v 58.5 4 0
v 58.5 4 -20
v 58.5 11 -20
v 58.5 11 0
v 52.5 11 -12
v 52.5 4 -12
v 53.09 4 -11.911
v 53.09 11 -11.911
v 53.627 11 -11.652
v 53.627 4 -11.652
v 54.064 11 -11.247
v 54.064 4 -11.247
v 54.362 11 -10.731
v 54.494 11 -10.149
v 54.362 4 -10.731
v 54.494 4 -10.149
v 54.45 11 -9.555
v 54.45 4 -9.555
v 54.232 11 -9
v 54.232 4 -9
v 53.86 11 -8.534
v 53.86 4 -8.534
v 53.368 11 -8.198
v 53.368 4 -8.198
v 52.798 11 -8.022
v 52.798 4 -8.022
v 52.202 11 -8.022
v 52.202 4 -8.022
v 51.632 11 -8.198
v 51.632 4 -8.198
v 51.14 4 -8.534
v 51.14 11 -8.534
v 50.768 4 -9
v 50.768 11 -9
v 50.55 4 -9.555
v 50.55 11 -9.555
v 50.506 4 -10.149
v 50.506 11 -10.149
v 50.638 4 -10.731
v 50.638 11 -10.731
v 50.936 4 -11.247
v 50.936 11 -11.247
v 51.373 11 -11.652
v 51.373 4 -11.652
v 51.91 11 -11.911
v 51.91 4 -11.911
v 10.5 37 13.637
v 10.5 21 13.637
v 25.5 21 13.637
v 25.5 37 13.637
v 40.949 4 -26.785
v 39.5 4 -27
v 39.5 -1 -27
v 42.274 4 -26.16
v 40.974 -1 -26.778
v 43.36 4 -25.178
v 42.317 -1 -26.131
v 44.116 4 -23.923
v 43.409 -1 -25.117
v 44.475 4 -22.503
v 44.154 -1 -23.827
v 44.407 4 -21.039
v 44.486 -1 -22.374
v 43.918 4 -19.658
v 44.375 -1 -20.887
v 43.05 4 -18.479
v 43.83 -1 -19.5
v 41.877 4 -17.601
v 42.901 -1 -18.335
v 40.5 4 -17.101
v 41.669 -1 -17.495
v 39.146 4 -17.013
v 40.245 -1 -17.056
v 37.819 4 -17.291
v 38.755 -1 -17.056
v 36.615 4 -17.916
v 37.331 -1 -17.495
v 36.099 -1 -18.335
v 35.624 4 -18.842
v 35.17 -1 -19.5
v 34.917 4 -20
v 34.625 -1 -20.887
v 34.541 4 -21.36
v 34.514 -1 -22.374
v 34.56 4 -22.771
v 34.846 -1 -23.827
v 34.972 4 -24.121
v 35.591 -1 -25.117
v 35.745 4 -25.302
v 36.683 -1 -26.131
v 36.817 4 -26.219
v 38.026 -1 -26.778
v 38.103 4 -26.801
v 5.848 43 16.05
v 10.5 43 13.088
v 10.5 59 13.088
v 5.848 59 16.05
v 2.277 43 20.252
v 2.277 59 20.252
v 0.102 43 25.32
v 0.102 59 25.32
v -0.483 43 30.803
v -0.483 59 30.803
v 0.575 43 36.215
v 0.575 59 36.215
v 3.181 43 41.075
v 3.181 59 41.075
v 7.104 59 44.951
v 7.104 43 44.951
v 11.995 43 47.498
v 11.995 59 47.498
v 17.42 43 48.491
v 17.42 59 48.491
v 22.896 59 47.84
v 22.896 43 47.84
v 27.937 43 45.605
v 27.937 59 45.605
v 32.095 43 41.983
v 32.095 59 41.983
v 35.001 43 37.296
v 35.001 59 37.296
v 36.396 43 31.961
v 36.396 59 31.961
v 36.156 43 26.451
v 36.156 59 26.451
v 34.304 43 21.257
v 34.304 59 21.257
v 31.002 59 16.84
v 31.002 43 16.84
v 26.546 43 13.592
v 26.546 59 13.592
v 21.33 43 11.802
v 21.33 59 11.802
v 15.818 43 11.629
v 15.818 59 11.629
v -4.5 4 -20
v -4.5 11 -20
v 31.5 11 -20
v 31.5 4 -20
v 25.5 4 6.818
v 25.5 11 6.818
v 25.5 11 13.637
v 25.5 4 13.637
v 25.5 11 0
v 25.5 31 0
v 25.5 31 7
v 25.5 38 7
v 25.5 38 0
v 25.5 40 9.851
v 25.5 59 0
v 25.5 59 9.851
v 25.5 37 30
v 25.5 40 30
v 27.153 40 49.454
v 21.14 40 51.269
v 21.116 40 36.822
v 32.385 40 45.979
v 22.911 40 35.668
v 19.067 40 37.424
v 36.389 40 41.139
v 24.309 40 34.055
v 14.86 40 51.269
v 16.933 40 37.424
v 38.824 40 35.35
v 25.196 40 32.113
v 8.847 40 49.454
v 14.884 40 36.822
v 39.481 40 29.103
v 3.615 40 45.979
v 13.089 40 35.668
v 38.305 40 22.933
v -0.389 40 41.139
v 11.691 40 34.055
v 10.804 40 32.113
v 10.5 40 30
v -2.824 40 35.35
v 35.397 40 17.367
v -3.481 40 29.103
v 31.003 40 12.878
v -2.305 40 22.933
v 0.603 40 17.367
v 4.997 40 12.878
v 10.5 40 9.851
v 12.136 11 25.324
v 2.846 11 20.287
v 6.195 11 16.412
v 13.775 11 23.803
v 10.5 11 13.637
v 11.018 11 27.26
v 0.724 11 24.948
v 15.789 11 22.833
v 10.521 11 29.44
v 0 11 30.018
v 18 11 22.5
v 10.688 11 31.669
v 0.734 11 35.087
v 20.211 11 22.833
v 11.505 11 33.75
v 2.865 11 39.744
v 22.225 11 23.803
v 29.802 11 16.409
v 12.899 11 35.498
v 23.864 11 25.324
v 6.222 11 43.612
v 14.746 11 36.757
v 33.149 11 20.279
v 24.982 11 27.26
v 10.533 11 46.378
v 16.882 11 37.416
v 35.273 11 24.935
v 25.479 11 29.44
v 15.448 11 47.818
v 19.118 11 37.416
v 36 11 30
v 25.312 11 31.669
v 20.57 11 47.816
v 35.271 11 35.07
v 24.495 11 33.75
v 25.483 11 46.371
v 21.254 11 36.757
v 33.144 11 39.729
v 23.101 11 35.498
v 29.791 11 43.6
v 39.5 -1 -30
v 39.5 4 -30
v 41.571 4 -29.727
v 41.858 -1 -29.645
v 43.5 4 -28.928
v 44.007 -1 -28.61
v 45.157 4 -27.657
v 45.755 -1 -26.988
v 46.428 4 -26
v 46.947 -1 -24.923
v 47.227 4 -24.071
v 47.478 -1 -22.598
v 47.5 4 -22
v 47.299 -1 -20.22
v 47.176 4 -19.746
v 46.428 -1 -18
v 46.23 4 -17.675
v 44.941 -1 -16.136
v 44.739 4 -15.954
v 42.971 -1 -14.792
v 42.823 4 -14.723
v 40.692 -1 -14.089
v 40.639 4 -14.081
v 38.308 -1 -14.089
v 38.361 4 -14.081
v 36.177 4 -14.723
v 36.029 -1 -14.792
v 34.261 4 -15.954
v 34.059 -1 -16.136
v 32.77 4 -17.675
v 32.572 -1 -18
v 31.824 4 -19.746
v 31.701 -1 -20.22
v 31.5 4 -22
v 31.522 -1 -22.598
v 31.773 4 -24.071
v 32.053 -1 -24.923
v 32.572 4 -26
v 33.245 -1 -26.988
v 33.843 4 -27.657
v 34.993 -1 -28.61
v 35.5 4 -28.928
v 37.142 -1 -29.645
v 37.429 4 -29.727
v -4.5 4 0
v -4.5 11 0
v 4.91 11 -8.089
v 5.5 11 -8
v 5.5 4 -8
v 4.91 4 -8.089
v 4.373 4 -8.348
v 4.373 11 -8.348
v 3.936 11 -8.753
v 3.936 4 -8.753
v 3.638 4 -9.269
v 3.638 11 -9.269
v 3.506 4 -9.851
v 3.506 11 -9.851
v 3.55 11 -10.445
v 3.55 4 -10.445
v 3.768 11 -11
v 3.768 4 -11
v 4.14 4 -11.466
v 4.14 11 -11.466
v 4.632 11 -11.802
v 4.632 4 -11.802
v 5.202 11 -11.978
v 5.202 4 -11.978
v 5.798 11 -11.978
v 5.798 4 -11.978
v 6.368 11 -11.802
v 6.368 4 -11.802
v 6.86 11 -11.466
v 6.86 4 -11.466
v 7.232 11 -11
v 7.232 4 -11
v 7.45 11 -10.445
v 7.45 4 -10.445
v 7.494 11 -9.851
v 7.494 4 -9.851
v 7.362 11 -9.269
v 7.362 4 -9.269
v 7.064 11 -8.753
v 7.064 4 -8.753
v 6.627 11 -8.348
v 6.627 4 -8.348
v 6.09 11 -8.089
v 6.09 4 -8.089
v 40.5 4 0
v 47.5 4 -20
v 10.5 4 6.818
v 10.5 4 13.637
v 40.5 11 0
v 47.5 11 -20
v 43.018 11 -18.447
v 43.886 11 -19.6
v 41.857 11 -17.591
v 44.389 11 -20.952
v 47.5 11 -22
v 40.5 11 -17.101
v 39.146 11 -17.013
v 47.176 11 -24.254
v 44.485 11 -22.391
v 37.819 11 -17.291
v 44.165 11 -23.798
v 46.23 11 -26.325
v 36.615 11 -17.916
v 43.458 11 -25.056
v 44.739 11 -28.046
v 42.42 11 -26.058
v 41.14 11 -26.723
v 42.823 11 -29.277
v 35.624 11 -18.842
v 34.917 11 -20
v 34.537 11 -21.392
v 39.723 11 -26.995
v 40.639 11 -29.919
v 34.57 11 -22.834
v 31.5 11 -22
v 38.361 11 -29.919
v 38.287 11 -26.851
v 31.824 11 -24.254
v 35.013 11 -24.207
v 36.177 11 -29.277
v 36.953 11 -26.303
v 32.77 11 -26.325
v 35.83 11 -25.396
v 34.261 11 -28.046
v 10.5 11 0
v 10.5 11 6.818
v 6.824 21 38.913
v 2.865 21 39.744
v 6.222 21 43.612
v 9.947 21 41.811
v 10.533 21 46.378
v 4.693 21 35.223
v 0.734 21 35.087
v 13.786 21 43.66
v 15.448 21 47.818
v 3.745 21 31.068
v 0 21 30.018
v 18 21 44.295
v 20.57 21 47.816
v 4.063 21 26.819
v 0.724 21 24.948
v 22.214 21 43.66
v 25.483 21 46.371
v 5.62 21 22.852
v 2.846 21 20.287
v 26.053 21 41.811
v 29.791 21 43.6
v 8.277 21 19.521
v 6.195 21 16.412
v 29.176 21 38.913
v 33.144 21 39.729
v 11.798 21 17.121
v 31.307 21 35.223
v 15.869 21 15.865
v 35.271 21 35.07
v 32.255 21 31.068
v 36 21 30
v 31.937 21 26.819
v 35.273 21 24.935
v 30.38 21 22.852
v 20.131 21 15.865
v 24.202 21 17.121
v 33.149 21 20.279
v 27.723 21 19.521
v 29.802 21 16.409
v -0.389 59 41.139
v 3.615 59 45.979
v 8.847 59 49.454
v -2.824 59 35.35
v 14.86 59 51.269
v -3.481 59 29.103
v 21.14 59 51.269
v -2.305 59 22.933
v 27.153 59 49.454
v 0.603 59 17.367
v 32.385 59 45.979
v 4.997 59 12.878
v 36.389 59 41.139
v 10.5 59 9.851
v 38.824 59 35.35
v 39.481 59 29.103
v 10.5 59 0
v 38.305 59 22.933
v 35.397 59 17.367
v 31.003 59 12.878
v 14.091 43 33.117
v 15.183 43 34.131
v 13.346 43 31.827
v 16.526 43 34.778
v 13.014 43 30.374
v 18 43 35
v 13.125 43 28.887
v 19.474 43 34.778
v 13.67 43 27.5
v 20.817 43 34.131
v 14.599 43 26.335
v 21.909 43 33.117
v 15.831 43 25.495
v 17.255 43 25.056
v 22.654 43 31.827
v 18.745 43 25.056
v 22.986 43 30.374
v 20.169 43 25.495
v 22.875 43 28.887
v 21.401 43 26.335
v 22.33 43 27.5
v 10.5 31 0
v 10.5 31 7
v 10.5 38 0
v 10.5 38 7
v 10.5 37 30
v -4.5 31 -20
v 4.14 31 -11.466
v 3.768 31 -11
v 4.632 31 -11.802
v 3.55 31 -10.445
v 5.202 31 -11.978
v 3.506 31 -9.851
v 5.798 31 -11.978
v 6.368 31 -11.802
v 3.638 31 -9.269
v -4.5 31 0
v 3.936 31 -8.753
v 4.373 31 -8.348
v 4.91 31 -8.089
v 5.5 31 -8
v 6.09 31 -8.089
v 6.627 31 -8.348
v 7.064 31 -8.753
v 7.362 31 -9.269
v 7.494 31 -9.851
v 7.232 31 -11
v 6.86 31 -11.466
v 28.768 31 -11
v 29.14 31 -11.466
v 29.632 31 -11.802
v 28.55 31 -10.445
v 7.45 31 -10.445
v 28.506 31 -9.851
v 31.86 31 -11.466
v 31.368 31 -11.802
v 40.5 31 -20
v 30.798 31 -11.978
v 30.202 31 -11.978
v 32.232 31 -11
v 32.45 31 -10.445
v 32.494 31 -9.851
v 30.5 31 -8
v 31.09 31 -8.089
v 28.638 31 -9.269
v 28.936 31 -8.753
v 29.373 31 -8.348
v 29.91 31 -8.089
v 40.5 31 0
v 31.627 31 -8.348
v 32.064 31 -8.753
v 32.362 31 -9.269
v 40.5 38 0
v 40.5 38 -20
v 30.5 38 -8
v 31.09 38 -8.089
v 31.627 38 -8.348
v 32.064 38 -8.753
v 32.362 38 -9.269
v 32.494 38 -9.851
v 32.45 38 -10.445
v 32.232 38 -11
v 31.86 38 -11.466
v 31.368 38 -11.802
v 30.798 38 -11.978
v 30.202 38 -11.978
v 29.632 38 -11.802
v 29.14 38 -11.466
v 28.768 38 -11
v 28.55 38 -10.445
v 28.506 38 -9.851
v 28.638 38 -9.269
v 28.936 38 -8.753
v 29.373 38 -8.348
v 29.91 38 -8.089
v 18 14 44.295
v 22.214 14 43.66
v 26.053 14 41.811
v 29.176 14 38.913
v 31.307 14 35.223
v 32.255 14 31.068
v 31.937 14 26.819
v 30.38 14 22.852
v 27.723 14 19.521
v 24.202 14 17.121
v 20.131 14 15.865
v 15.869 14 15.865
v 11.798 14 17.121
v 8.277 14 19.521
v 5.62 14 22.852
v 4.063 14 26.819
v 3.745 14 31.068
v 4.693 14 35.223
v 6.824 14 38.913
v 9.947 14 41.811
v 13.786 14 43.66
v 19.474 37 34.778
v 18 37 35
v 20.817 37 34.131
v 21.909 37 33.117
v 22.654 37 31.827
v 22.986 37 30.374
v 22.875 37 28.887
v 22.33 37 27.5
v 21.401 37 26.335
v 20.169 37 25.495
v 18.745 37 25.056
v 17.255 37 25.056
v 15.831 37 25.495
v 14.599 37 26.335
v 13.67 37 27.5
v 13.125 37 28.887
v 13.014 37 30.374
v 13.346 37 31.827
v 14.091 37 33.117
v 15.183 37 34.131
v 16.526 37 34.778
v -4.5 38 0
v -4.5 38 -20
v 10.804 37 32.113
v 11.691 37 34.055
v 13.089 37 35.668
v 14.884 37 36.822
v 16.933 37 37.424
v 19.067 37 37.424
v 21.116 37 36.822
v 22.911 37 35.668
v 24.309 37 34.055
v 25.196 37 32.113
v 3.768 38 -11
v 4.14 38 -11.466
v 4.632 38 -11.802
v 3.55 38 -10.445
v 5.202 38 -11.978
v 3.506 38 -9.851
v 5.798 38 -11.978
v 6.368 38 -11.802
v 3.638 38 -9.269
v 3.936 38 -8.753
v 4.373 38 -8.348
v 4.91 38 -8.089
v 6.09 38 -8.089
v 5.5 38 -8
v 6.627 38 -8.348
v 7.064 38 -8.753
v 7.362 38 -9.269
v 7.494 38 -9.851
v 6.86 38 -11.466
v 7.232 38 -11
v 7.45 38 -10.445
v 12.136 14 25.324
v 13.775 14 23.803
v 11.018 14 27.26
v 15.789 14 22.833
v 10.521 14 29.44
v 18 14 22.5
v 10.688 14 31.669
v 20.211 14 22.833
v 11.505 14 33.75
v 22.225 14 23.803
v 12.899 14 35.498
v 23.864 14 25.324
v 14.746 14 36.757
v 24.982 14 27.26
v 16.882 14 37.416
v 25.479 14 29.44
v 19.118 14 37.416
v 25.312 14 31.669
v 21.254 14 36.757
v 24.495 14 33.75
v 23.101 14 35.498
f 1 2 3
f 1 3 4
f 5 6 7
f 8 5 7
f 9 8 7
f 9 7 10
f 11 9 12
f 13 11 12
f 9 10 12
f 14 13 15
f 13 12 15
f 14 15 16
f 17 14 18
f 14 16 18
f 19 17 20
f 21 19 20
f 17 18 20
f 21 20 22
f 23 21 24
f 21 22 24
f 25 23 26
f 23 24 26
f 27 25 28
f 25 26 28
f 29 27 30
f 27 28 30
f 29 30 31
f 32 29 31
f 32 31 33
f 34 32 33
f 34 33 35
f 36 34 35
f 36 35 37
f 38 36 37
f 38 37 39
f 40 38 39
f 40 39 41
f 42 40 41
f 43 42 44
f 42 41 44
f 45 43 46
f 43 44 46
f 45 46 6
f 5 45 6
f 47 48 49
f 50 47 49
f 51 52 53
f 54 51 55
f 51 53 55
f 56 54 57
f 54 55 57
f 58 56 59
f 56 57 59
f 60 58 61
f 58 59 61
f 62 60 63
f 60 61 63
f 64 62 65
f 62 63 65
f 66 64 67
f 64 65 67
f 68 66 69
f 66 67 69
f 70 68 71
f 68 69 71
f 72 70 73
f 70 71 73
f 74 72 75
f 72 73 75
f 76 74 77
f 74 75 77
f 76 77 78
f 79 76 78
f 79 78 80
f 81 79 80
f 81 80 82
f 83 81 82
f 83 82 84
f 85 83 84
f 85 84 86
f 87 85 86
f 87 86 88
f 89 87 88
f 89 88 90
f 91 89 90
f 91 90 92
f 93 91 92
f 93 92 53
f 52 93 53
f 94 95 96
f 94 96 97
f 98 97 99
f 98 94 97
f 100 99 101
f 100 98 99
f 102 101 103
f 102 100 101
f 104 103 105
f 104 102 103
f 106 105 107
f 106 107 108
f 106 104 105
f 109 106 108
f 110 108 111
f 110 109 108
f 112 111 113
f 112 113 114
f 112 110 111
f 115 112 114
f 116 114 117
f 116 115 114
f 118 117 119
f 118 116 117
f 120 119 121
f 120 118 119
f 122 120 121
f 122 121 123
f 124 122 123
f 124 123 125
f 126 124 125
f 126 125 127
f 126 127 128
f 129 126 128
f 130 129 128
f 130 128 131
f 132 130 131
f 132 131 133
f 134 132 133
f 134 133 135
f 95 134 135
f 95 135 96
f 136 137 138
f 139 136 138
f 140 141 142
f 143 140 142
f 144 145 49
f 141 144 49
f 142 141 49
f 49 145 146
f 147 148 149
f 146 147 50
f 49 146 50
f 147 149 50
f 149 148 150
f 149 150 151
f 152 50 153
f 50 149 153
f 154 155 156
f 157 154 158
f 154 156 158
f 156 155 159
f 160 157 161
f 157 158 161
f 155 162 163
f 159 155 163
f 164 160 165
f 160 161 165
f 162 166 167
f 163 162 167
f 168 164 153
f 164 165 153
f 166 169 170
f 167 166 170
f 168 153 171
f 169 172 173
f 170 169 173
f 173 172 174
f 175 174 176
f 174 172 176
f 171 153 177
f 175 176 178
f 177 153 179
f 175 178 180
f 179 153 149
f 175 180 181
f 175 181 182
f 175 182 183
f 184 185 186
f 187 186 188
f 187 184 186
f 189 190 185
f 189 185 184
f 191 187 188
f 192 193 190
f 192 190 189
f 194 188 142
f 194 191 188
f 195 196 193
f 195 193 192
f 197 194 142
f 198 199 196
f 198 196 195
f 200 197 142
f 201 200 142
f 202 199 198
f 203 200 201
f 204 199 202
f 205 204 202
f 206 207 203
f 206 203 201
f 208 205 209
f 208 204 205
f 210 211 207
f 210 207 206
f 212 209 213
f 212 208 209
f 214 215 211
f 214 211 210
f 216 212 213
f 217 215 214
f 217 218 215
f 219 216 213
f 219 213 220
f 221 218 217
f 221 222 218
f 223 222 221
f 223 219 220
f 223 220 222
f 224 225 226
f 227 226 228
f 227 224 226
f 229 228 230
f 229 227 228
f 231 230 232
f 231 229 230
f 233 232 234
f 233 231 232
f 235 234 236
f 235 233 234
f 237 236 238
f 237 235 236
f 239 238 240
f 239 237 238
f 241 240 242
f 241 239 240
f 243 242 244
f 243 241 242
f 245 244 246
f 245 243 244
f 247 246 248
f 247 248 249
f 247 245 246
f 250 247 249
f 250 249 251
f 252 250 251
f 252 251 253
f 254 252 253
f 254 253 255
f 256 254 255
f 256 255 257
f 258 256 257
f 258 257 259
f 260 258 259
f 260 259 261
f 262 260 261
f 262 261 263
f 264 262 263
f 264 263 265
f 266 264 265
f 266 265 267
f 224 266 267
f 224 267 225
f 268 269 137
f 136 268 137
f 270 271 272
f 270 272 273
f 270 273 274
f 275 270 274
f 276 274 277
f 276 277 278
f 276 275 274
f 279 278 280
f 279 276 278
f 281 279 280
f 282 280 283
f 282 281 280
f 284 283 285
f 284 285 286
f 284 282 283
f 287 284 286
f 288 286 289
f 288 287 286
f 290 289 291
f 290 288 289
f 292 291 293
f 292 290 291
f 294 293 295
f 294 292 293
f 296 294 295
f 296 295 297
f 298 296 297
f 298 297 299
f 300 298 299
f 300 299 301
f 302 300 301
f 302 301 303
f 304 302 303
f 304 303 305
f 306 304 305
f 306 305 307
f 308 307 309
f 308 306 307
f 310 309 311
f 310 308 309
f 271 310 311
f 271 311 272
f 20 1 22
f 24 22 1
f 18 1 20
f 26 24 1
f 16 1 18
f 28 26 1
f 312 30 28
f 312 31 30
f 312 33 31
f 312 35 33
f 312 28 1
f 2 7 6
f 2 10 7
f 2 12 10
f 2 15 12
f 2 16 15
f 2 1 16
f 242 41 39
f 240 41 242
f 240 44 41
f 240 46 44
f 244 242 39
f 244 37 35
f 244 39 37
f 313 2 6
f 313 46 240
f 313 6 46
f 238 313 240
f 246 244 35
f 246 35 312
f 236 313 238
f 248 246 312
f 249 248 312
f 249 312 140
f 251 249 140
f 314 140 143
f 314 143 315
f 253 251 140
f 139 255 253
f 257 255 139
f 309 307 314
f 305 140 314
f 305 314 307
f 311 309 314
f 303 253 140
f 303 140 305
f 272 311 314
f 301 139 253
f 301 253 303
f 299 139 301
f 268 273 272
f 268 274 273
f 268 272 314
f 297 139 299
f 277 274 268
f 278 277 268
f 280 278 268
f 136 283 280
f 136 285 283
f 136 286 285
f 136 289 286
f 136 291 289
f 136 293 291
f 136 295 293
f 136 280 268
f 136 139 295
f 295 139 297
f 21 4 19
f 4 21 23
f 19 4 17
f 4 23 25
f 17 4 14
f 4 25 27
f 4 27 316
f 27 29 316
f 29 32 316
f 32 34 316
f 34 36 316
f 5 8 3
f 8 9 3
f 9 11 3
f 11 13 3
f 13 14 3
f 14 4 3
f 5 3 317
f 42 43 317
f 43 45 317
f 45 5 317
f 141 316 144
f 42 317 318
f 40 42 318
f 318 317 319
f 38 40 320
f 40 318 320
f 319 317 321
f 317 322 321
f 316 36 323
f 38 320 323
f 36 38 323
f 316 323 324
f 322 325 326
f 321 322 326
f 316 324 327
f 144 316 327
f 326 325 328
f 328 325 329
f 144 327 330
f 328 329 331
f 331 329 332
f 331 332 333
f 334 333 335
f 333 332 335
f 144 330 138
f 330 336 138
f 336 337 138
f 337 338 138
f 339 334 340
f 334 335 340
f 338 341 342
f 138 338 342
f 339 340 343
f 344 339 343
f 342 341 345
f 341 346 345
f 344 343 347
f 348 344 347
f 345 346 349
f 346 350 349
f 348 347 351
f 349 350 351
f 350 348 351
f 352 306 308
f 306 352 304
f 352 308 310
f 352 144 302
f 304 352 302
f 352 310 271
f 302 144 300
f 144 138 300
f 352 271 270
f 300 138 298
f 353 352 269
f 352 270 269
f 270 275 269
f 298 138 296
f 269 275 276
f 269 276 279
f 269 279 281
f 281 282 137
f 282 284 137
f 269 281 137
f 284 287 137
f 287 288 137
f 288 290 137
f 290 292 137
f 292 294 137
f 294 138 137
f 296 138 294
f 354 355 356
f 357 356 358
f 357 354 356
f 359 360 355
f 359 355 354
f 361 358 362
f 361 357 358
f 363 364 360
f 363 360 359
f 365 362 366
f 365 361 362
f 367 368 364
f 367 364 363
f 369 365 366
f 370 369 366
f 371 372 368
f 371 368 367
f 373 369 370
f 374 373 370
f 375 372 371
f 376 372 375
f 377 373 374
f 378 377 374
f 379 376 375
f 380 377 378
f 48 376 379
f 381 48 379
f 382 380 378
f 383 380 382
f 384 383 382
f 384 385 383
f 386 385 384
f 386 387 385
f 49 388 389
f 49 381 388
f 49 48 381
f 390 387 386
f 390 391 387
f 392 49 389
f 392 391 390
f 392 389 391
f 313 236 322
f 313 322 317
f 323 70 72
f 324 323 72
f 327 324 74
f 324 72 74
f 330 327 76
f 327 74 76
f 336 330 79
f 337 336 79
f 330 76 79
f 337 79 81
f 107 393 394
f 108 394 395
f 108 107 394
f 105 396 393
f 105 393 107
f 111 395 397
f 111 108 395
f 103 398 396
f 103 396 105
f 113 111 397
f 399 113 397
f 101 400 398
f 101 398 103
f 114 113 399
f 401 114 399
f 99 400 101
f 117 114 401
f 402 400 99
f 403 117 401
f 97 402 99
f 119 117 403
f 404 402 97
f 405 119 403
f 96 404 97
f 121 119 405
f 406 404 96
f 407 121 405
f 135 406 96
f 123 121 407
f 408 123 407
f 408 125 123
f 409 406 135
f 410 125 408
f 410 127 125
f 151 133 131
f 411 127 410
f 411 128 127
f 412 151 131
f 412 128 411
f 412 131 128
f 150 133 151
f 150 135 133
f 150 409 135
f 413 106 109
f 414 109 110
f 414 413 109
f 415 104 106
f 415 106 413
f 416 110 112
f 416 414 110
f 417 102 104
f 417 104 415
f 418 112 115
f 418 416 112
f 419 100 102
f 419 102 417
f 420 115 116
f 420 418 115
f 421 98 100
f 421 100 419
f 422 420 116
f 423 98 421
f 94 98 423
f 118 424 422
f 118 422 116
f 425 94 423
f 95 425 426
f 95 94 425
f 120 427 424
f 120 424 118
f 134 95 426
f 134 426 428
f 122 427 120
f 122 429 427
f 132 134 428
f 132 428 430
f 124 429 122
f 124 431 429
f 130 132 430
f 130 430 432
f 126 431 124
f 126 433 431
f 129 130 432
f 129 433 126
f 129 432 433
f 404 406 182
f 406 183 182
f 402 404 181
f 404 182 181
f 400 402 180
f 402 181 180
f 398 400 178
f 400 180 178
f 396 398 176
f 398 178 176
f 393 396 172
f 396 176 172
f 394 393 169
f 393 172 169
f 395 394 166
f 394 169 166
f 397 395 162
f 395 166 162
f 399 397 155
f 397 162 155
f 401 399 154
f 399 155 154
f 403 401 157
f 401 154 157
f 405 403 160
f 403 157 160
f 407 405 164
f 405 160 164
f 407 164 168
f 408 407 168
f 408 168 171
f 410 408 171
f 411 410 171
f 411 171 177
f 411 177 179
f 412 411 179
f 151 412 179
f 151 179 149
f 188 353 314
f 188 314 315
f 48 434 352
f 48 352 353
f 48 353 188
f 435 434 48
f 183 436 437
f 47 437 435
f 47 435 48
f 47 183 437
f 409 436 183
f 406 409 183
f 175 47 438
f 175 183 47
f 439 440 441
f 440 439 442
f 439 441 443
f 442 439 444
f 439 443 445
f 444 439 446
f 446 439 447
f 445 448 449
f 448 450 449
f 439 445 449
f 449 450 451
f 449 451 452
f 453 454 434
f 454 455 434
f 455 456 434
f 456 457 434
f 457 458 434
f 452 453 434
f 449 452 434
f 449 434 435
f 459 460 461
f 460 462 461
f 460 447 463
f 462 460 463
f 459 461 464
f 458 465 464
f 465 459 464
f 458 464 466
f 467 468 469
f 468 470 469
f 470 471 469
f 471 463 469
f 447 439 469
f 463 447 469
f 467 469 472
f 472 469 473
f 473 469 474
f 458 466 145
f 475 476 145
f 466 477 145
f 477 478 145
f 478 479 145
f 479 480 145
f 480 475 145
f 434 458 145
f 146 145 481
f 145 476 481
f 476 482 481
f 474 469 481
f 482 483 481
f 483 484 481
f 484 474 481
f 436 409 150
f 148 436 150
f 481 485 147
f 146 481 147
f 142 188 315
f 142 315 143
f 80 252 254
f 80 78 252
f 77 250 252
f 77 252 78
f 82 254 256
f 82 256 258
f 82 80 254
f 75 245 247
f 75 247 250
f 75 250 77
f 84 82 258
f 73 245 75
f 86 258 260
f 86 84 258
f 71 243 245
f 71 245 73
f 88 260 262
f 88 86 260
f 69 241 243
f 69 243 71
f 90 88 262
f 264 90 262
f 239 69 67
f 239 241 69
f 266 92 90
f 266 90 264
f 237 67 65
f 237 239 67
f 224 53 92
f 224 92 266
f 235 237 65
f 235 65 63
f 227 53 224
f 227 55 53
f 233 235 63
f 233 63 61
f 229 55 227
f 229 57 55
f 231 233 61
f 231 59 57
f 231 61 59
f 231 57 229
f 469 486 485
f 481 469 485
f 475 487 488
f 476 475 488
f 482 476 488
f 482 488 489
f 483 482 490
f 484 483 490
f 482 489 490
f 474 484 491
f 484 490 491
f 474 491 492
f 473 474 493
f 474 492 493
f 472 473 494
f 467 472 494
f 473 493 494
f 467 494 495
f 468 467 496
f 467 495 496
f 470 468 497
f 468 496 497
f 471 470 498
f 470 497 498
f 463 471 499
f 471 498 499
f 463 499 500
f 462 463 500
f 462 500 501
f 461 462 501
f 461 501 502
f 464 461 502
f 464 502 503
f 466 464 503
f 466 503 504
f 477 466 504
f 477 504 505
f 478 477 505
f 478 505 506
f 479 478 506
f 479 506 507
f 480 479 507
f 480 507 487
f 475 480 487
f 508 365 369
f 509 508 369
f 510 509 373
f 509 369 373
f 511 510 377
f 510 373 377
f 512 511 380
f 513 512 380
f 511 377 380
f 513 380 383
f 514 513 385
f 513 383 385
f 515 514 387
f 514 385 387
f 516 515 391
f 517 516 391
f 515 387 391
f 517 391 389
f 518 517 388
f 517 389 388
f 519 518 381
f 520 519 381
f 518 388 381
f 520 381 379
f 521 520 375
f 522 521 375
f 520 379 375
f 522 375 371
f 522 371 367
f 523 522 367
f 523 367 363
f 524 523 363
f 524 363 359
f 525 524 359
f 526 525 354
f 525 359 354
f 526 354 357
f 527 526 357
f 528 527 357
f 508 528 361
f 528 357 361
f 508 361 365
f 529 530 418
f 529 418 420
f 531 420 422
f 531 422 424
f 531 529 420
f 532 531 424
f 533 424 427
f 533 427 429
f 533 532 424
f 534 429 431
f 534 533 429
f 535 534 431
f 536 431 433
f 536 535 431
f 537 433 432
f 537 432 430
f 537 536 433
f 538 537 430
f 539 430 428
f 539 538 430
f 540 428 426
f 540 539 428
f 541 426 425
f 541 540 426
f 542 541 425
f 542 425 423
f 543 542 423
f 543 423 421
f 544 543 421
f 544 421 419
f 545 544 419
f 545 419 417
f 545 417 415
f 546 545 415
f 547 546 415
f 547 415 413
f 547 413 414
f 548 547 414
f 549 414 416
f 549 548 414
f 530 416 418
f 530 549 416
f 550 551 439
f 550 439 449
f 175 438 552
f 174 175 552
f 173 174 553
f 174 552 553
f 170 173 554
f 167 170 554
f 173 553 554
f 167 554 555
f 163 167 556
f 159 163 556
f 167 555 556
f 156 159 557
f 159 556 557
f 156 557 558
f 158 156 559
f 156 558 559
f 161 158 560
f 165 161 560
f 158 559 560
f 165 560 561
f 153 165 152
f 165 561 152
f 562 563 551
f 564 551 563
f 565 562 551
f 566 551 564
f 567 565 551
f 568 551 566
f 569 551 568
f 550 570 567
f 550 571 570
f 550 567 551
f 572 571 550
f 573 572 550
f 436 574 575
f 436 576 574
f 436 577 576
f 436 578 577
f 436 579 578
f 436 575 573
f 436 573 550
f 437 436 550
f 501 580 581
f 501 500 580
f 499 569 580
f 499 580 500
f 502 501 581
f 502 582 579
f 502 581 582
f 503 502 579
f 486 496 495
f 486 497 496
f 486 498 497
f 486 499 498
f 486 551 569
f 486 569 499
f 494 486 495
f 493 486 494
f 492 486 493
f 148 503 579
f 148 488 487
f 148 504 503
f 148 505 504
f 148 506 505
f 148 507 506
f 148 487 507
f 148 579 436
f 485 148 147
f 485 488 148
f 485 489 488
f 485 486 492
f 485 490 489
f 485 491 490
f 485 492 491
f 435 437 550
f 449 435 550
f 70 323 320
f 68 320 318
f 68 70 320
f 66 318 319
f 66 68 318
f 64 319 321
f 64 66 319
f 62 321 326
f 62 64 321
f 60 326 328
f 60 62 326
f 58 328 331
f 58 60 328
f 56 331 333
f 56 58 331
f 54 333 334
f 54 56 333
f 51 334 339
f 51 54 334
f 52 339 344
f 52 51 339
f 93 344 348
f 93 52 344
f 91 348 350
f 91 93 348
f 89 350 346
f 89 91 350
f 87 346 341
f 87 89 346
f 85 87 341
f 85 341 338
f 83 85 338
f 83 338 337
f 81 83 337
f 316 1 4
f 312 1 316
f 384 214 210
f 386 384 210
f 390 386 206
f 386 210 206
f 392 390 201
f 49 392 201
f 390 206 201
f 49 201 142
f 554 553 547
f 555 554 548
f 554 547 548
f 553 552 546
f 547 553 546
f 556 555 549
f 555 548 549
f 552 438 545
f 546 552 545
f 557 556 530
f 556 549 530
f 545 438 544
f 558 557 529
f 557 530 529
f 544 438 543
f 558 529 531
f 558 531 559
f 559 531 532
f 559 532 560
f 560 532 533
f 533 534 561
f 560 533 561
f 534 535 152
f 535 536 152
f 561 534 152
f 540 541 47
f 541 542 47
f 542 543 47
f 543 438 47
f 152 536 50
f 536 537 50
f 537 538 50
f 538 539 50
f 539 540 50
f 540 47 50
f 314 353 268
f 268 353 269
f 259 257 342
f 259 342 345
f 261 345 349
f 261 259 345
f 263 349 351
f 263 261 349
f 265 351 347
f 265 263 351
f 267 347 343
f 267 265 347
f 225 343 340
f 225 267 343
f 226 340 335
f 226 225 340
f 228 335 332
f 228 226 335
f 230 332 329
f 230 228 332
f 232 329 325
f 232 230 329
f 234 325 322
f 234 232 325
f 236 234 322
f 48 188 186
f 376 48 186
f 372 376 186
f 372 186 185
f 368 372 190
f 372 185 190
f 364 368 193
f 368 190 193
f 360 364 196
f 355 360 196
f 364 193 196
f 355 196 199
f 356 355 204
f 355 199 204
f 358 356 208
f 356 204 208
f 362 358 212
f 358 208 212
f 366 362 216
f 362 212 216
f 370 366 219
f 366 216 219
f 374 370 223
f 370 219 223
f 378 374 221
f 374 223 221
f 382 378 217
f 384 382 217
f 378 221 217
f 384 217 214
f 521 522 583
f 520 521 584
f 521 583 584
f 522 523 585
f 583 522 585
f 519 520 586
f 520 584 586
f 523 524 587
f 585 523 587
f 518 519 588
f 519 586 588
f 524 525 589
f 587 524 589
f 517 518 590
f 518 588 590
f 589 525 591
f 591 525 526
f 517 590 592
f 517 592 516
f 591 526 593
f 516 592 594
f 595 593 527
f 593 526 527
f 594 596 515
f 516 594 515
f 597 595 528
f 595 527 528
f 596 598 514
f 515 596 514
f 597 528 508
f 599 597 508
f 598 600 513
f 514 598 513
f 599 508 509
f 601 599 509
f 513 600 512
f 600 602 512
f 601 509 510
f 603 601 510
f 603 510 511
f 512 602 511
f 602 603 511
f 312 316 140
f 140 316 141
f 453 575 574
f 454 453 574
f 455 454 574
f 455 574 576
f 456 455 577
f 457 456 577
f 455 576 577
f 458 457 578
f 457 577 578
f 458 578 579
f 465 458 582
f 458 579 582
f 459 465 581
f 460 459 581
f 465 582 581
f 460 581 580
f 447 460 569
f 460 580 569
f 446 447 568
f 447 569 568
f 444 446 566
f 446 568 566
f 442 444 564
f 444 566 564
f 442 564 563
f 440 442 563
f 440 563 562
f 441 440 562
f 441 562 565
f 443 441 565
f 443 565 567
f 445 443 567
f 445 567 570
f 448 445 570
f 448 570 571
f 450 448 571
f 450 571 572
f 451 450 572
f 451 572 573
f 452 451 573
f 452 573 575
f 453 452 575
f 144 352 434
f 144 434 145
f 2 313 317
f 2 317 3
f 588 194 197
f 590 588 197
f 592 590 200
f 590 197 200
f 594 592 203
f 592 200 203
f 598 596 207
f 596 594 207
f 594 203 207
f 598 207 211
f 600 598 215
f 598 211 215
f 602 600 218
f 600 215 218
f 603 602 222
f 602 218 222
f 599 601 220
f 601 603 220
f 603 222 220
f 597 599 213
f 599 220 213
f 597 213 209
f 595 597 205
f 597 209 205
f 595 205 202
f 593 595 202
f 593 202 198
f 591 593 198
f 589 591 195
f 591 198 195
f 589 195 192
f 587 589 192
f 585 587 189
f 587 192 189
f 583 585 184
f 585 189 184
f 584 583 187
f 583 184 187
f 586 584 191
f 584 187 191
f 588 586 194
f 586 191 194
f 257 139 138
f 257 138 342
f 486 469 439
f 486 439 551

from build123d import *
from build123d.topology import SkipClean

# Parameters (mm, degrees)
ESQUISSE1_W              = 36
ESQUISSE1_H              = 20
BOSS_EXTRU_1_DEPTH       = 5
ESQUISSE2_W              = 15
ESQUISSE2_H              = 10.591208458
ESQUISSE2_H_2            = 4
BOSS_EXTRU_2_DEPTH       = 32
ESQUISSE3_R              = 5
BOSS_EXTRU_3_DEPTH       = 6
ESQUISSE4_R              = 21.5
ESQUISSE4_R_2            = 18.5
BOSS_EXTRU_4_DEPTH       = 16
BOSS_EXTRU_5_START       = -3
ESQUISSE5_R              = 21.5
ESQUISSE5_R_2            = 7.5
BOSS_EXTRU_5_DEPTH       = 3
ESQUISSE6_W              = 15
ESQUISSE6_H              = 3.413220749
BOSS_EXTRU_6_DEPTH       = 16
ESQUISSE8_R              = 2
ENL_V_MAT_EXTRU_1_DEPTH  = 16
ESQUISSE9_W              = 15
ESQUISSE9_H              = 10
BOSS_EXTRU_7_DEPTH       = 30
BOSS_EXTRU_8_START       = -10
ESQUISSE10_R             = 21.5
ESQUISSE10_R_2           = 15
BOSS_EXTRU_8_DEPTH       = 10
ESQUISSE11_R             = 15
ESQUISSE11_R_2           = 7.5
BOSS_EXTRU_9_DEPTH       = 3
ESQUISSE12_R             = 15
ENL_V_MAT_EXTRU_2_DEPTH  = 7
ESQUISSE13_R             = 7.5
ENL_V_MAT_EXTRU_3_DEPTH  = 7
BOSS_EXTRU_10_START      = 7
ESQUISSE14_R             = 15
ESQUISSE14_R_2           = 14.295
BOSS_EXTRU_10_DEPTH      = 7
ENL_V_MAT_EXTRU_4_DEPTH  = 10
ESQUISSE16_W             = 15
ESQUISSE16_H             = 16
BOSS_EXTRU_11_DEPTH      = 22
ESQUISSE18_W             = 15
ESQUISSE18_H             = 13.636931828
BOSS_EXTRU_12_DEPTH      = 22
ESQUISSE19_W             = 36
ESQUISSE19_H             = 20
ENL_V_MAT_EXTRU_5_DEPTH  = 88.712598867
ESQUISSE20_W             = 15
ESQUISSE20_H             = 7
BOSS_EXTRU_13_DEPTH      = 20
BOSS_EXTRU_14_DEPTH      = 15
BOSS_EXTRU_14_DEPTH_BACK = 30
ESQUISSE22_W             = 27
ESQUISSE22_H             = 7
ESQUISSE23_R             = 2
ENL_V_MAT_EXTRU_6_DEPTH  = 71.862542997
ESQUISSE24_R             = 2
ESQUISSE24_W             = 15
ESQUISSE24_H             = 6.818465914
BOSS_EXTRU_15_DEPTH      = 7
ESQUISSE25_R             = 2
BOSS_EXTRU_16_DEPTH      = 7
ESQUISSE27_R             = 5
ENL_V_MAT_EXTRU_7_DEPTH  = 7
BOSS_EXTRU_18_START      = 5
ESQUISSE28_R             = 8
ESQUISSE28_R_2           = 5
BOSS_EXTRU_18_DEPTH      = 5


with BuildPart() as part:
    # Esquisse1 → Boss.-Extru.1 (new body)
    with BuildSketch(Plane(origin=(0, 0, 0), x_dir=(1, 0, 0), z_dir=(0, 1, 0))):
        with Locations((18, 10)):
            Rectangle(ESQUISSE1_W, ESQUISSE1_H)
    extrude(amount=BOSS_EXTRU_1_DEPTH)

    # Esquisse2 → Boss.-Extru.2 (add)
    with BuildSketch(Plane(origin=(0, 5, 0), x_dir=(1, 0, 0), z_dir=(0, 1, 0))):
        with Locations((18, 5.295604229)):
            Rectangle(ESQUISSE2_W, ESQUISSE2_H)
        with Locations((18, 12.591208458)):
            Rectangle(ESQUISSE2_W, ESQUISSE2_H_2)
    extrude(amount=BOSS_EXTRU_2_DEPTH)

    # Esquisse3 → Boss.-Extru.3 (add)
    with BuildSketch(Plane(origin=(0, 37, 0), x_dir=(1, 0, 0), z_dir=(0, 1, 0))):
        with BuildLine():
            Line((10.5, 14.591208458), (10.5, -30))
            ThreePointArc((10.5, -30), (18, -37.5), (25.5, -30))
            Line((25.5, -30), (25.5, 14.591208458))
            Line((25.5, 14.591208458), (10.5, 14.591208458))
        make_face()
        with Locations(Location((18, -30, 0), (0, 0, 270))):
            Circle(ESQUISSE3_R, mode=Mode.SUBTRACT)
    extrude(amount=BOSS_EXTRU_3_DEPTH)

    # Esquisse4 → Boss.-Extru.4 (add)
    with BuildSketch(Plane(origin=(0, 43, 0), x_dir=(1, 0, 0), z_dir=(0, 1, 0))):
        with Locations(Location((18, -30, 0), (0, 0, 69.583789871))):
            Circle(ESQUISSE4_R)
        with Locations(Location((18, -30, 0), (0, 0, 113.916534422))):
            Circle(ESQUISSE4_R_2, mode=Mode.SUBTRACT)
    extrude(amount=BOSS_EXTRU_4_DEPTH)

    # Esquisse5 → Boss.-Extru.5 (add)
    with BuildSketch(Plane(origin=(0, 43, 0), x_dir=(1, 0, 0), z_dir=(0, 1, 0)).offset(BOSS_EXTRU_5_START)):
        with Locations(Location((18, -30, 0), (0, 0, 69.583789871))):
            Circle(ESQUISSE5_R)
        with Locations((18, -30)):
            Circle(ESQUISSE5_R_2, mode=Mode.SUBTRACT)
    extrude(amount=BOSS_EXTRU_5_DEPTH)

    # Esquisse6 → Boss.-Extru.6 (add)
    with BuildSketch(Plane(origin=(0, 43, 0), x_dir=(1, 0, 0), z_dir=(0, 1, 0))):
        with Locations((18, 12.884598084)):
            Rectangle(ESQUISSE6_W, ESQUISSE6_H)
    extrude(amount=BOSS_EXTRU_6_DEPTH)

    # Esquisse8 → Enlèv. mat.-Extru.1 (cut)
    with BuildSketch(Plane.XZ):
        with Locations(Location((6, -10, 0), (0, 0, 270))):
            Circle(ESQUISSE8_R)
        with Locations(Location((30, -10, 0), (0, 0, 270))):
            Circle(ESQUISSE8_R)
    extrude(amount=-ENL_V_MAT_EXTRU_1_DEPTH, mode=Mode.SUBTRACT)

    # Esquisse9 → Boss.-Extru.7 (add)
    with BuildSketch(Plane.XY):
        with Locations((18, 16)):
            Rectangle(ESQUISSE9_W, ESQUISSE9_H)
    extrude(amount=BOSS_EXTRU_7_DEPTH)

    # Esquisse10 → Boss.-Extru.8 (add)
    with BuildSketch(Plane.XZ.offset(-11).offset(BOSS_EXTRU_8_START)):
        with Locations(Location((18, 30, 0), (0, 0, 290.416210129))):
            Circle(ESQUISSE10_R)
        with Locations((18, 30)):
            Circle(ESQUISSE10_R_2, mode=Mode.SUBTRACT)
    extrude(amount=BOSS_EXTRU_8_DEPTH)

    # Esquisse11 → Boss.-Extru.9 (add)
    with BuildSketch(Plane.XZ.offset(-11)):
        with Locations((18, 30)):
            Circle(ESQUISSE11_R)
        with Locations((18, 30)):
            Circle(ESQUISSE11_R_2, mode=Mode.SUBTRACT)
    extrude(amount=-BOSS_EXTRU_9_DEPTH)

    # Esquisse12 → Enlèv. mat.-Extru.2 (cut)
    with BuildSketch(Plane(origin=(0, 21, 0), x_dir=(1, 0, 0), z_dir=(0, 1, 0))):
        with Locations(Location((18, -30, 0), (0, 0, 90))):
            Circle(ESQUISSE12_R)
    extrude(amount=-ENL_V_MAT_EXTRU_2_DEPTH, mode=Mode.SUBTRACT)

    # Esquisse13 → Enlèv. mat.-Extru.3 (cut)
    with BuildSketch(Plane.XZ.offset(-11)):
        with Locations(Location((18, 30, 0), (0, 0, 270))):
            Circle(ESQUISSE13_R)
    extrude(amount=-ENL_V_MAT_EXTRU_3_DEPTH, mode=Mode.SUBTRACT)

    # Esquisse14 → Boss.-Extru.10 (add)
    with BuildSketch(Plane(origin=(0, 14, 0), x_dir=(1, 0, 0), z_dir=(0, 1, 0)).offset(BOSS_EXTRU_10_START)):
        with Locations((18, -30)):
            Circle(ESQUISSE14_R)
        with Locations(Location((18, -30, 0), (0, 0, 270))):
            Circle(ESQUISSE14_R_2, mode=Mode.SUBTRACT)
    extrude(amount=-BOSS_EXTRU_10_DEPTH)

    # Esquisse15 → Enlèv. mat.-Extru.4 (cut)
    with BuildSketch(Plane.XZ.offset(-11)):
        with BuildLine():
            ThreePointArc((39.5, 30), (5.732155854, 47.656443583), (10.5, 9.85055832))
            Line((10.5, 9.85055832), (10.5, 13.636931828))
            ThreePointArc((10.5, 13.636931828), (8.278888952, 45.149257408), (36, 30))
            ThreePointArc((36, 30), (33.149257408, 20.278888952), (25.5, 13.636931828))
            Line((25.5, 13.636931828), (25.5, 9.85055832))
            ThreePointArc((25.5, 9.85055832), (35.656443583, 17.732155854), (39.5, 30))
        make_face()
    extrude(amount=-ENL_V_MAT_EXTRU_4_DEPTH, mode=Mode.SUBTRACT)

    # Esquisse16 → Boss.-Extru.11 (add)
    with BuildSketch(Plane.XY.offset(-11.177987709)):
        with Locations((18, 51)):
            Rectangle(ESQUISSE16_W, ESQUISSE16_H)
    extrude(amount=BOSS_EXTRU_11_DEPTH)

    # Esquisse18 → Boss.-Extru.12 (add)
    with BuildSketch(Plane(origin=(0, 21, 0), x_dir=(1, 0, 0), z_dir=(0, 1, 0))):
        with Locations((18, -6.818465914)):
            Rectangle(ESQUISSE18_W, ESQUISSE18_H)
    extrude(amount=BOSS_EXTRU_12_DEPTH)

    # Esquisse19 → Enlèv. mat.-Extru.5 (cut, through all)
    with BuildSketch(Plane.XZ):
        with Locations((18, -10)):
            Rectangle(ESQUISSE19_W, ESQUISSE19_H)
    extrude(amount=-ENL_V_MAT_EXTRU_5_DEPTH, mode=Mode.SUBTRACT)

    # Esquisse20 → Boss.-Extru.13 (add)
    with BuildSketch(Plane(origin=(0, 0, 0), x_dir=(-1, 0, 0), z_dir=(0, 0, -1))):
        with Locations((-18, 34.5)):
            Rectangle(ESQUISSE20_W, ESQUISSE20_H)
    extrude(amount=BOSS_EXTRU_13_DEPTH)

    # Esquisse22 → Boss.-Extru.14 (add, two sides: drawn at the far end of the back side and taken through both)
    with BuildSketch(Plane.ZY.offset(-10.5).offset(-BOSS_EXTRU_14_DEPTH_BACK)):
        with Locations((-6.5, 34.5)):
            Rectangle(ESQUISSE22_W, ESQUISSE22_H)
    extrude(amount=BOSS_EXTRU_14_DEPTH + BOSS_EXTRU_14_DEPTH_BACK)

    # Esquisse23 → Enlèv. mat.-Extru.6 (cut, through all)
    with BuildSketch(Plane(origin=(0, 38, 0), x_dir=(1, 0, 0), z_dir=(0, 1, 0))):
        with Locations(Location((30.5, 10, 0), (0, 0, 270))):
            Circle(ESQUISSE23_R)
        with Locations(Location((5.5, 10, 0), (0, 0, 270))):
            Circle(ESQUISSE23_R)
        Polygon((-4.5, -7), (10.5, -7), (-4.5, 0), align=None)
        Polygon((40.5, -7), (40.5, 0), (25.5, -7), align=None)
    extrude(amount=-ENL_V_MAT_EXTRU_6_DEPTH, mode=Mode.SUBTRACT)

    # Esquisse24 → Boss.-Extru.15 (add)
    # profile 1 of 5: a face of its own
    with BuildSketch(Plane.XZ.offset(-11)):
        Polygon((10.5, 6.818465914), (-4.5, 0), (10.5, 0), align=None)
    # profile 2 of 5: a face of its own
    with BuildSketch(Plane.XZ.offset(-11)):
        Polygon((10.5, 0), (-4.5, 0), (-4.5, -20), (40.5, -20), (40.5, 0), (25.5, 0), align=None)
        with Locations(Location((5.5, -10, 0), (0, 0, 90))):
            Circle(ESQUISSE24_R, mode=Mode.SUBTRACT)
    # profile 3 of 5: a face of its own
    with BuildSketch(Plane.XZ.offset(-11)):
        with Locations((18, 3.409232957)):
            Rectangle(ESQUISSE24_W, ESQUISSE24_H)
    # profile 4 of 5: a face of its own
    with BuildSketch(Plane.XZ.offset(-11)):
        with Locations((18, 10.227698871)):
            Rectangle(ESQUISSE24_W, ESQUISSE24_H)
    # profile 5 of 5: a face of its own
    with BuildSketch(Plane.XZ.offset(-11)):
        Polygon((25.5, 6.818465914), (25.5, 0), (40.5, 0), align=None)
    extrude(amount=BOSS_EXTRU_15_DEPTH)

    # Esquisse25 → Boss.-Extru.16 (add)
    with BuildSketch(Plane(origin=(0, 4, 0), x_dir=(-1, 0, 0), z_dir=(0, -1, 0))):
        with BuildLine():
            Line((-34.917424305, 20), (-31.5, 20))
            Line((-31.5, 20), (-31.5, 22))
            ThreePointArc((-31.5, 22), (-39.5, 30), (-47.5, 22))
            Line((-47.5, 22), (-47.5, 20))
            Line((-47.5, 20), (-58.5, 20))
            Line((-58.5, 20), (-58.5, 0))
            Line((-58.5, 0), (-40.5, 0))
            Line((-40.5, 0), (-40.5, 17.101020514))
            ThreePointArc((-40.5, 17.101020514), (-41.804285717, 26.437371669), (-34.917424305, 20))
        make_face()
        with Locations(Location((-52.5, 10, 0), (0, 0, 90))):
            Circle(ESQUISSE25_R, mode=Mode.SUBTRACT)
    extrude(amount=-BOSS_EXTRU_16_DEPTH)

    # Esquisse27 → Enlèv. mat.-Extru.7 (cut)
    with BuildSketch(Plane.XZ.offset(-4)):
        with Locations(Location((39.5, -22, 0), (0, 0, 270))):
            Circle(ESQUISSE27_R)
    extrude(amount=-ENL_V_MAT_EXTRU_7_DEPTH, mode=Mode.SUBTRACT)

    # Esquisse28 → Boss.-Extru.18 (add)
    with SkipClean():  # the faces are left unmerged after this step: merging them gives an invalid solid
        with BuildSketch(Plane.XZ.offset(-4).offset(BOSS_EXTRU_18_START)):
            with Locations(Location((39.5, -22, 0), (0, 0, 270))):
                Circle(ESQUISSE28_R)
            with Locations(Location((39.5, -22, 0), (0, 0, 270))):
                Circle(ESQUISSE28_R_2, mode=Mode.SUBTRACT)
        extrude(amount=-BOSS_EXTRU_18_DEPTH)


solid = part.part
